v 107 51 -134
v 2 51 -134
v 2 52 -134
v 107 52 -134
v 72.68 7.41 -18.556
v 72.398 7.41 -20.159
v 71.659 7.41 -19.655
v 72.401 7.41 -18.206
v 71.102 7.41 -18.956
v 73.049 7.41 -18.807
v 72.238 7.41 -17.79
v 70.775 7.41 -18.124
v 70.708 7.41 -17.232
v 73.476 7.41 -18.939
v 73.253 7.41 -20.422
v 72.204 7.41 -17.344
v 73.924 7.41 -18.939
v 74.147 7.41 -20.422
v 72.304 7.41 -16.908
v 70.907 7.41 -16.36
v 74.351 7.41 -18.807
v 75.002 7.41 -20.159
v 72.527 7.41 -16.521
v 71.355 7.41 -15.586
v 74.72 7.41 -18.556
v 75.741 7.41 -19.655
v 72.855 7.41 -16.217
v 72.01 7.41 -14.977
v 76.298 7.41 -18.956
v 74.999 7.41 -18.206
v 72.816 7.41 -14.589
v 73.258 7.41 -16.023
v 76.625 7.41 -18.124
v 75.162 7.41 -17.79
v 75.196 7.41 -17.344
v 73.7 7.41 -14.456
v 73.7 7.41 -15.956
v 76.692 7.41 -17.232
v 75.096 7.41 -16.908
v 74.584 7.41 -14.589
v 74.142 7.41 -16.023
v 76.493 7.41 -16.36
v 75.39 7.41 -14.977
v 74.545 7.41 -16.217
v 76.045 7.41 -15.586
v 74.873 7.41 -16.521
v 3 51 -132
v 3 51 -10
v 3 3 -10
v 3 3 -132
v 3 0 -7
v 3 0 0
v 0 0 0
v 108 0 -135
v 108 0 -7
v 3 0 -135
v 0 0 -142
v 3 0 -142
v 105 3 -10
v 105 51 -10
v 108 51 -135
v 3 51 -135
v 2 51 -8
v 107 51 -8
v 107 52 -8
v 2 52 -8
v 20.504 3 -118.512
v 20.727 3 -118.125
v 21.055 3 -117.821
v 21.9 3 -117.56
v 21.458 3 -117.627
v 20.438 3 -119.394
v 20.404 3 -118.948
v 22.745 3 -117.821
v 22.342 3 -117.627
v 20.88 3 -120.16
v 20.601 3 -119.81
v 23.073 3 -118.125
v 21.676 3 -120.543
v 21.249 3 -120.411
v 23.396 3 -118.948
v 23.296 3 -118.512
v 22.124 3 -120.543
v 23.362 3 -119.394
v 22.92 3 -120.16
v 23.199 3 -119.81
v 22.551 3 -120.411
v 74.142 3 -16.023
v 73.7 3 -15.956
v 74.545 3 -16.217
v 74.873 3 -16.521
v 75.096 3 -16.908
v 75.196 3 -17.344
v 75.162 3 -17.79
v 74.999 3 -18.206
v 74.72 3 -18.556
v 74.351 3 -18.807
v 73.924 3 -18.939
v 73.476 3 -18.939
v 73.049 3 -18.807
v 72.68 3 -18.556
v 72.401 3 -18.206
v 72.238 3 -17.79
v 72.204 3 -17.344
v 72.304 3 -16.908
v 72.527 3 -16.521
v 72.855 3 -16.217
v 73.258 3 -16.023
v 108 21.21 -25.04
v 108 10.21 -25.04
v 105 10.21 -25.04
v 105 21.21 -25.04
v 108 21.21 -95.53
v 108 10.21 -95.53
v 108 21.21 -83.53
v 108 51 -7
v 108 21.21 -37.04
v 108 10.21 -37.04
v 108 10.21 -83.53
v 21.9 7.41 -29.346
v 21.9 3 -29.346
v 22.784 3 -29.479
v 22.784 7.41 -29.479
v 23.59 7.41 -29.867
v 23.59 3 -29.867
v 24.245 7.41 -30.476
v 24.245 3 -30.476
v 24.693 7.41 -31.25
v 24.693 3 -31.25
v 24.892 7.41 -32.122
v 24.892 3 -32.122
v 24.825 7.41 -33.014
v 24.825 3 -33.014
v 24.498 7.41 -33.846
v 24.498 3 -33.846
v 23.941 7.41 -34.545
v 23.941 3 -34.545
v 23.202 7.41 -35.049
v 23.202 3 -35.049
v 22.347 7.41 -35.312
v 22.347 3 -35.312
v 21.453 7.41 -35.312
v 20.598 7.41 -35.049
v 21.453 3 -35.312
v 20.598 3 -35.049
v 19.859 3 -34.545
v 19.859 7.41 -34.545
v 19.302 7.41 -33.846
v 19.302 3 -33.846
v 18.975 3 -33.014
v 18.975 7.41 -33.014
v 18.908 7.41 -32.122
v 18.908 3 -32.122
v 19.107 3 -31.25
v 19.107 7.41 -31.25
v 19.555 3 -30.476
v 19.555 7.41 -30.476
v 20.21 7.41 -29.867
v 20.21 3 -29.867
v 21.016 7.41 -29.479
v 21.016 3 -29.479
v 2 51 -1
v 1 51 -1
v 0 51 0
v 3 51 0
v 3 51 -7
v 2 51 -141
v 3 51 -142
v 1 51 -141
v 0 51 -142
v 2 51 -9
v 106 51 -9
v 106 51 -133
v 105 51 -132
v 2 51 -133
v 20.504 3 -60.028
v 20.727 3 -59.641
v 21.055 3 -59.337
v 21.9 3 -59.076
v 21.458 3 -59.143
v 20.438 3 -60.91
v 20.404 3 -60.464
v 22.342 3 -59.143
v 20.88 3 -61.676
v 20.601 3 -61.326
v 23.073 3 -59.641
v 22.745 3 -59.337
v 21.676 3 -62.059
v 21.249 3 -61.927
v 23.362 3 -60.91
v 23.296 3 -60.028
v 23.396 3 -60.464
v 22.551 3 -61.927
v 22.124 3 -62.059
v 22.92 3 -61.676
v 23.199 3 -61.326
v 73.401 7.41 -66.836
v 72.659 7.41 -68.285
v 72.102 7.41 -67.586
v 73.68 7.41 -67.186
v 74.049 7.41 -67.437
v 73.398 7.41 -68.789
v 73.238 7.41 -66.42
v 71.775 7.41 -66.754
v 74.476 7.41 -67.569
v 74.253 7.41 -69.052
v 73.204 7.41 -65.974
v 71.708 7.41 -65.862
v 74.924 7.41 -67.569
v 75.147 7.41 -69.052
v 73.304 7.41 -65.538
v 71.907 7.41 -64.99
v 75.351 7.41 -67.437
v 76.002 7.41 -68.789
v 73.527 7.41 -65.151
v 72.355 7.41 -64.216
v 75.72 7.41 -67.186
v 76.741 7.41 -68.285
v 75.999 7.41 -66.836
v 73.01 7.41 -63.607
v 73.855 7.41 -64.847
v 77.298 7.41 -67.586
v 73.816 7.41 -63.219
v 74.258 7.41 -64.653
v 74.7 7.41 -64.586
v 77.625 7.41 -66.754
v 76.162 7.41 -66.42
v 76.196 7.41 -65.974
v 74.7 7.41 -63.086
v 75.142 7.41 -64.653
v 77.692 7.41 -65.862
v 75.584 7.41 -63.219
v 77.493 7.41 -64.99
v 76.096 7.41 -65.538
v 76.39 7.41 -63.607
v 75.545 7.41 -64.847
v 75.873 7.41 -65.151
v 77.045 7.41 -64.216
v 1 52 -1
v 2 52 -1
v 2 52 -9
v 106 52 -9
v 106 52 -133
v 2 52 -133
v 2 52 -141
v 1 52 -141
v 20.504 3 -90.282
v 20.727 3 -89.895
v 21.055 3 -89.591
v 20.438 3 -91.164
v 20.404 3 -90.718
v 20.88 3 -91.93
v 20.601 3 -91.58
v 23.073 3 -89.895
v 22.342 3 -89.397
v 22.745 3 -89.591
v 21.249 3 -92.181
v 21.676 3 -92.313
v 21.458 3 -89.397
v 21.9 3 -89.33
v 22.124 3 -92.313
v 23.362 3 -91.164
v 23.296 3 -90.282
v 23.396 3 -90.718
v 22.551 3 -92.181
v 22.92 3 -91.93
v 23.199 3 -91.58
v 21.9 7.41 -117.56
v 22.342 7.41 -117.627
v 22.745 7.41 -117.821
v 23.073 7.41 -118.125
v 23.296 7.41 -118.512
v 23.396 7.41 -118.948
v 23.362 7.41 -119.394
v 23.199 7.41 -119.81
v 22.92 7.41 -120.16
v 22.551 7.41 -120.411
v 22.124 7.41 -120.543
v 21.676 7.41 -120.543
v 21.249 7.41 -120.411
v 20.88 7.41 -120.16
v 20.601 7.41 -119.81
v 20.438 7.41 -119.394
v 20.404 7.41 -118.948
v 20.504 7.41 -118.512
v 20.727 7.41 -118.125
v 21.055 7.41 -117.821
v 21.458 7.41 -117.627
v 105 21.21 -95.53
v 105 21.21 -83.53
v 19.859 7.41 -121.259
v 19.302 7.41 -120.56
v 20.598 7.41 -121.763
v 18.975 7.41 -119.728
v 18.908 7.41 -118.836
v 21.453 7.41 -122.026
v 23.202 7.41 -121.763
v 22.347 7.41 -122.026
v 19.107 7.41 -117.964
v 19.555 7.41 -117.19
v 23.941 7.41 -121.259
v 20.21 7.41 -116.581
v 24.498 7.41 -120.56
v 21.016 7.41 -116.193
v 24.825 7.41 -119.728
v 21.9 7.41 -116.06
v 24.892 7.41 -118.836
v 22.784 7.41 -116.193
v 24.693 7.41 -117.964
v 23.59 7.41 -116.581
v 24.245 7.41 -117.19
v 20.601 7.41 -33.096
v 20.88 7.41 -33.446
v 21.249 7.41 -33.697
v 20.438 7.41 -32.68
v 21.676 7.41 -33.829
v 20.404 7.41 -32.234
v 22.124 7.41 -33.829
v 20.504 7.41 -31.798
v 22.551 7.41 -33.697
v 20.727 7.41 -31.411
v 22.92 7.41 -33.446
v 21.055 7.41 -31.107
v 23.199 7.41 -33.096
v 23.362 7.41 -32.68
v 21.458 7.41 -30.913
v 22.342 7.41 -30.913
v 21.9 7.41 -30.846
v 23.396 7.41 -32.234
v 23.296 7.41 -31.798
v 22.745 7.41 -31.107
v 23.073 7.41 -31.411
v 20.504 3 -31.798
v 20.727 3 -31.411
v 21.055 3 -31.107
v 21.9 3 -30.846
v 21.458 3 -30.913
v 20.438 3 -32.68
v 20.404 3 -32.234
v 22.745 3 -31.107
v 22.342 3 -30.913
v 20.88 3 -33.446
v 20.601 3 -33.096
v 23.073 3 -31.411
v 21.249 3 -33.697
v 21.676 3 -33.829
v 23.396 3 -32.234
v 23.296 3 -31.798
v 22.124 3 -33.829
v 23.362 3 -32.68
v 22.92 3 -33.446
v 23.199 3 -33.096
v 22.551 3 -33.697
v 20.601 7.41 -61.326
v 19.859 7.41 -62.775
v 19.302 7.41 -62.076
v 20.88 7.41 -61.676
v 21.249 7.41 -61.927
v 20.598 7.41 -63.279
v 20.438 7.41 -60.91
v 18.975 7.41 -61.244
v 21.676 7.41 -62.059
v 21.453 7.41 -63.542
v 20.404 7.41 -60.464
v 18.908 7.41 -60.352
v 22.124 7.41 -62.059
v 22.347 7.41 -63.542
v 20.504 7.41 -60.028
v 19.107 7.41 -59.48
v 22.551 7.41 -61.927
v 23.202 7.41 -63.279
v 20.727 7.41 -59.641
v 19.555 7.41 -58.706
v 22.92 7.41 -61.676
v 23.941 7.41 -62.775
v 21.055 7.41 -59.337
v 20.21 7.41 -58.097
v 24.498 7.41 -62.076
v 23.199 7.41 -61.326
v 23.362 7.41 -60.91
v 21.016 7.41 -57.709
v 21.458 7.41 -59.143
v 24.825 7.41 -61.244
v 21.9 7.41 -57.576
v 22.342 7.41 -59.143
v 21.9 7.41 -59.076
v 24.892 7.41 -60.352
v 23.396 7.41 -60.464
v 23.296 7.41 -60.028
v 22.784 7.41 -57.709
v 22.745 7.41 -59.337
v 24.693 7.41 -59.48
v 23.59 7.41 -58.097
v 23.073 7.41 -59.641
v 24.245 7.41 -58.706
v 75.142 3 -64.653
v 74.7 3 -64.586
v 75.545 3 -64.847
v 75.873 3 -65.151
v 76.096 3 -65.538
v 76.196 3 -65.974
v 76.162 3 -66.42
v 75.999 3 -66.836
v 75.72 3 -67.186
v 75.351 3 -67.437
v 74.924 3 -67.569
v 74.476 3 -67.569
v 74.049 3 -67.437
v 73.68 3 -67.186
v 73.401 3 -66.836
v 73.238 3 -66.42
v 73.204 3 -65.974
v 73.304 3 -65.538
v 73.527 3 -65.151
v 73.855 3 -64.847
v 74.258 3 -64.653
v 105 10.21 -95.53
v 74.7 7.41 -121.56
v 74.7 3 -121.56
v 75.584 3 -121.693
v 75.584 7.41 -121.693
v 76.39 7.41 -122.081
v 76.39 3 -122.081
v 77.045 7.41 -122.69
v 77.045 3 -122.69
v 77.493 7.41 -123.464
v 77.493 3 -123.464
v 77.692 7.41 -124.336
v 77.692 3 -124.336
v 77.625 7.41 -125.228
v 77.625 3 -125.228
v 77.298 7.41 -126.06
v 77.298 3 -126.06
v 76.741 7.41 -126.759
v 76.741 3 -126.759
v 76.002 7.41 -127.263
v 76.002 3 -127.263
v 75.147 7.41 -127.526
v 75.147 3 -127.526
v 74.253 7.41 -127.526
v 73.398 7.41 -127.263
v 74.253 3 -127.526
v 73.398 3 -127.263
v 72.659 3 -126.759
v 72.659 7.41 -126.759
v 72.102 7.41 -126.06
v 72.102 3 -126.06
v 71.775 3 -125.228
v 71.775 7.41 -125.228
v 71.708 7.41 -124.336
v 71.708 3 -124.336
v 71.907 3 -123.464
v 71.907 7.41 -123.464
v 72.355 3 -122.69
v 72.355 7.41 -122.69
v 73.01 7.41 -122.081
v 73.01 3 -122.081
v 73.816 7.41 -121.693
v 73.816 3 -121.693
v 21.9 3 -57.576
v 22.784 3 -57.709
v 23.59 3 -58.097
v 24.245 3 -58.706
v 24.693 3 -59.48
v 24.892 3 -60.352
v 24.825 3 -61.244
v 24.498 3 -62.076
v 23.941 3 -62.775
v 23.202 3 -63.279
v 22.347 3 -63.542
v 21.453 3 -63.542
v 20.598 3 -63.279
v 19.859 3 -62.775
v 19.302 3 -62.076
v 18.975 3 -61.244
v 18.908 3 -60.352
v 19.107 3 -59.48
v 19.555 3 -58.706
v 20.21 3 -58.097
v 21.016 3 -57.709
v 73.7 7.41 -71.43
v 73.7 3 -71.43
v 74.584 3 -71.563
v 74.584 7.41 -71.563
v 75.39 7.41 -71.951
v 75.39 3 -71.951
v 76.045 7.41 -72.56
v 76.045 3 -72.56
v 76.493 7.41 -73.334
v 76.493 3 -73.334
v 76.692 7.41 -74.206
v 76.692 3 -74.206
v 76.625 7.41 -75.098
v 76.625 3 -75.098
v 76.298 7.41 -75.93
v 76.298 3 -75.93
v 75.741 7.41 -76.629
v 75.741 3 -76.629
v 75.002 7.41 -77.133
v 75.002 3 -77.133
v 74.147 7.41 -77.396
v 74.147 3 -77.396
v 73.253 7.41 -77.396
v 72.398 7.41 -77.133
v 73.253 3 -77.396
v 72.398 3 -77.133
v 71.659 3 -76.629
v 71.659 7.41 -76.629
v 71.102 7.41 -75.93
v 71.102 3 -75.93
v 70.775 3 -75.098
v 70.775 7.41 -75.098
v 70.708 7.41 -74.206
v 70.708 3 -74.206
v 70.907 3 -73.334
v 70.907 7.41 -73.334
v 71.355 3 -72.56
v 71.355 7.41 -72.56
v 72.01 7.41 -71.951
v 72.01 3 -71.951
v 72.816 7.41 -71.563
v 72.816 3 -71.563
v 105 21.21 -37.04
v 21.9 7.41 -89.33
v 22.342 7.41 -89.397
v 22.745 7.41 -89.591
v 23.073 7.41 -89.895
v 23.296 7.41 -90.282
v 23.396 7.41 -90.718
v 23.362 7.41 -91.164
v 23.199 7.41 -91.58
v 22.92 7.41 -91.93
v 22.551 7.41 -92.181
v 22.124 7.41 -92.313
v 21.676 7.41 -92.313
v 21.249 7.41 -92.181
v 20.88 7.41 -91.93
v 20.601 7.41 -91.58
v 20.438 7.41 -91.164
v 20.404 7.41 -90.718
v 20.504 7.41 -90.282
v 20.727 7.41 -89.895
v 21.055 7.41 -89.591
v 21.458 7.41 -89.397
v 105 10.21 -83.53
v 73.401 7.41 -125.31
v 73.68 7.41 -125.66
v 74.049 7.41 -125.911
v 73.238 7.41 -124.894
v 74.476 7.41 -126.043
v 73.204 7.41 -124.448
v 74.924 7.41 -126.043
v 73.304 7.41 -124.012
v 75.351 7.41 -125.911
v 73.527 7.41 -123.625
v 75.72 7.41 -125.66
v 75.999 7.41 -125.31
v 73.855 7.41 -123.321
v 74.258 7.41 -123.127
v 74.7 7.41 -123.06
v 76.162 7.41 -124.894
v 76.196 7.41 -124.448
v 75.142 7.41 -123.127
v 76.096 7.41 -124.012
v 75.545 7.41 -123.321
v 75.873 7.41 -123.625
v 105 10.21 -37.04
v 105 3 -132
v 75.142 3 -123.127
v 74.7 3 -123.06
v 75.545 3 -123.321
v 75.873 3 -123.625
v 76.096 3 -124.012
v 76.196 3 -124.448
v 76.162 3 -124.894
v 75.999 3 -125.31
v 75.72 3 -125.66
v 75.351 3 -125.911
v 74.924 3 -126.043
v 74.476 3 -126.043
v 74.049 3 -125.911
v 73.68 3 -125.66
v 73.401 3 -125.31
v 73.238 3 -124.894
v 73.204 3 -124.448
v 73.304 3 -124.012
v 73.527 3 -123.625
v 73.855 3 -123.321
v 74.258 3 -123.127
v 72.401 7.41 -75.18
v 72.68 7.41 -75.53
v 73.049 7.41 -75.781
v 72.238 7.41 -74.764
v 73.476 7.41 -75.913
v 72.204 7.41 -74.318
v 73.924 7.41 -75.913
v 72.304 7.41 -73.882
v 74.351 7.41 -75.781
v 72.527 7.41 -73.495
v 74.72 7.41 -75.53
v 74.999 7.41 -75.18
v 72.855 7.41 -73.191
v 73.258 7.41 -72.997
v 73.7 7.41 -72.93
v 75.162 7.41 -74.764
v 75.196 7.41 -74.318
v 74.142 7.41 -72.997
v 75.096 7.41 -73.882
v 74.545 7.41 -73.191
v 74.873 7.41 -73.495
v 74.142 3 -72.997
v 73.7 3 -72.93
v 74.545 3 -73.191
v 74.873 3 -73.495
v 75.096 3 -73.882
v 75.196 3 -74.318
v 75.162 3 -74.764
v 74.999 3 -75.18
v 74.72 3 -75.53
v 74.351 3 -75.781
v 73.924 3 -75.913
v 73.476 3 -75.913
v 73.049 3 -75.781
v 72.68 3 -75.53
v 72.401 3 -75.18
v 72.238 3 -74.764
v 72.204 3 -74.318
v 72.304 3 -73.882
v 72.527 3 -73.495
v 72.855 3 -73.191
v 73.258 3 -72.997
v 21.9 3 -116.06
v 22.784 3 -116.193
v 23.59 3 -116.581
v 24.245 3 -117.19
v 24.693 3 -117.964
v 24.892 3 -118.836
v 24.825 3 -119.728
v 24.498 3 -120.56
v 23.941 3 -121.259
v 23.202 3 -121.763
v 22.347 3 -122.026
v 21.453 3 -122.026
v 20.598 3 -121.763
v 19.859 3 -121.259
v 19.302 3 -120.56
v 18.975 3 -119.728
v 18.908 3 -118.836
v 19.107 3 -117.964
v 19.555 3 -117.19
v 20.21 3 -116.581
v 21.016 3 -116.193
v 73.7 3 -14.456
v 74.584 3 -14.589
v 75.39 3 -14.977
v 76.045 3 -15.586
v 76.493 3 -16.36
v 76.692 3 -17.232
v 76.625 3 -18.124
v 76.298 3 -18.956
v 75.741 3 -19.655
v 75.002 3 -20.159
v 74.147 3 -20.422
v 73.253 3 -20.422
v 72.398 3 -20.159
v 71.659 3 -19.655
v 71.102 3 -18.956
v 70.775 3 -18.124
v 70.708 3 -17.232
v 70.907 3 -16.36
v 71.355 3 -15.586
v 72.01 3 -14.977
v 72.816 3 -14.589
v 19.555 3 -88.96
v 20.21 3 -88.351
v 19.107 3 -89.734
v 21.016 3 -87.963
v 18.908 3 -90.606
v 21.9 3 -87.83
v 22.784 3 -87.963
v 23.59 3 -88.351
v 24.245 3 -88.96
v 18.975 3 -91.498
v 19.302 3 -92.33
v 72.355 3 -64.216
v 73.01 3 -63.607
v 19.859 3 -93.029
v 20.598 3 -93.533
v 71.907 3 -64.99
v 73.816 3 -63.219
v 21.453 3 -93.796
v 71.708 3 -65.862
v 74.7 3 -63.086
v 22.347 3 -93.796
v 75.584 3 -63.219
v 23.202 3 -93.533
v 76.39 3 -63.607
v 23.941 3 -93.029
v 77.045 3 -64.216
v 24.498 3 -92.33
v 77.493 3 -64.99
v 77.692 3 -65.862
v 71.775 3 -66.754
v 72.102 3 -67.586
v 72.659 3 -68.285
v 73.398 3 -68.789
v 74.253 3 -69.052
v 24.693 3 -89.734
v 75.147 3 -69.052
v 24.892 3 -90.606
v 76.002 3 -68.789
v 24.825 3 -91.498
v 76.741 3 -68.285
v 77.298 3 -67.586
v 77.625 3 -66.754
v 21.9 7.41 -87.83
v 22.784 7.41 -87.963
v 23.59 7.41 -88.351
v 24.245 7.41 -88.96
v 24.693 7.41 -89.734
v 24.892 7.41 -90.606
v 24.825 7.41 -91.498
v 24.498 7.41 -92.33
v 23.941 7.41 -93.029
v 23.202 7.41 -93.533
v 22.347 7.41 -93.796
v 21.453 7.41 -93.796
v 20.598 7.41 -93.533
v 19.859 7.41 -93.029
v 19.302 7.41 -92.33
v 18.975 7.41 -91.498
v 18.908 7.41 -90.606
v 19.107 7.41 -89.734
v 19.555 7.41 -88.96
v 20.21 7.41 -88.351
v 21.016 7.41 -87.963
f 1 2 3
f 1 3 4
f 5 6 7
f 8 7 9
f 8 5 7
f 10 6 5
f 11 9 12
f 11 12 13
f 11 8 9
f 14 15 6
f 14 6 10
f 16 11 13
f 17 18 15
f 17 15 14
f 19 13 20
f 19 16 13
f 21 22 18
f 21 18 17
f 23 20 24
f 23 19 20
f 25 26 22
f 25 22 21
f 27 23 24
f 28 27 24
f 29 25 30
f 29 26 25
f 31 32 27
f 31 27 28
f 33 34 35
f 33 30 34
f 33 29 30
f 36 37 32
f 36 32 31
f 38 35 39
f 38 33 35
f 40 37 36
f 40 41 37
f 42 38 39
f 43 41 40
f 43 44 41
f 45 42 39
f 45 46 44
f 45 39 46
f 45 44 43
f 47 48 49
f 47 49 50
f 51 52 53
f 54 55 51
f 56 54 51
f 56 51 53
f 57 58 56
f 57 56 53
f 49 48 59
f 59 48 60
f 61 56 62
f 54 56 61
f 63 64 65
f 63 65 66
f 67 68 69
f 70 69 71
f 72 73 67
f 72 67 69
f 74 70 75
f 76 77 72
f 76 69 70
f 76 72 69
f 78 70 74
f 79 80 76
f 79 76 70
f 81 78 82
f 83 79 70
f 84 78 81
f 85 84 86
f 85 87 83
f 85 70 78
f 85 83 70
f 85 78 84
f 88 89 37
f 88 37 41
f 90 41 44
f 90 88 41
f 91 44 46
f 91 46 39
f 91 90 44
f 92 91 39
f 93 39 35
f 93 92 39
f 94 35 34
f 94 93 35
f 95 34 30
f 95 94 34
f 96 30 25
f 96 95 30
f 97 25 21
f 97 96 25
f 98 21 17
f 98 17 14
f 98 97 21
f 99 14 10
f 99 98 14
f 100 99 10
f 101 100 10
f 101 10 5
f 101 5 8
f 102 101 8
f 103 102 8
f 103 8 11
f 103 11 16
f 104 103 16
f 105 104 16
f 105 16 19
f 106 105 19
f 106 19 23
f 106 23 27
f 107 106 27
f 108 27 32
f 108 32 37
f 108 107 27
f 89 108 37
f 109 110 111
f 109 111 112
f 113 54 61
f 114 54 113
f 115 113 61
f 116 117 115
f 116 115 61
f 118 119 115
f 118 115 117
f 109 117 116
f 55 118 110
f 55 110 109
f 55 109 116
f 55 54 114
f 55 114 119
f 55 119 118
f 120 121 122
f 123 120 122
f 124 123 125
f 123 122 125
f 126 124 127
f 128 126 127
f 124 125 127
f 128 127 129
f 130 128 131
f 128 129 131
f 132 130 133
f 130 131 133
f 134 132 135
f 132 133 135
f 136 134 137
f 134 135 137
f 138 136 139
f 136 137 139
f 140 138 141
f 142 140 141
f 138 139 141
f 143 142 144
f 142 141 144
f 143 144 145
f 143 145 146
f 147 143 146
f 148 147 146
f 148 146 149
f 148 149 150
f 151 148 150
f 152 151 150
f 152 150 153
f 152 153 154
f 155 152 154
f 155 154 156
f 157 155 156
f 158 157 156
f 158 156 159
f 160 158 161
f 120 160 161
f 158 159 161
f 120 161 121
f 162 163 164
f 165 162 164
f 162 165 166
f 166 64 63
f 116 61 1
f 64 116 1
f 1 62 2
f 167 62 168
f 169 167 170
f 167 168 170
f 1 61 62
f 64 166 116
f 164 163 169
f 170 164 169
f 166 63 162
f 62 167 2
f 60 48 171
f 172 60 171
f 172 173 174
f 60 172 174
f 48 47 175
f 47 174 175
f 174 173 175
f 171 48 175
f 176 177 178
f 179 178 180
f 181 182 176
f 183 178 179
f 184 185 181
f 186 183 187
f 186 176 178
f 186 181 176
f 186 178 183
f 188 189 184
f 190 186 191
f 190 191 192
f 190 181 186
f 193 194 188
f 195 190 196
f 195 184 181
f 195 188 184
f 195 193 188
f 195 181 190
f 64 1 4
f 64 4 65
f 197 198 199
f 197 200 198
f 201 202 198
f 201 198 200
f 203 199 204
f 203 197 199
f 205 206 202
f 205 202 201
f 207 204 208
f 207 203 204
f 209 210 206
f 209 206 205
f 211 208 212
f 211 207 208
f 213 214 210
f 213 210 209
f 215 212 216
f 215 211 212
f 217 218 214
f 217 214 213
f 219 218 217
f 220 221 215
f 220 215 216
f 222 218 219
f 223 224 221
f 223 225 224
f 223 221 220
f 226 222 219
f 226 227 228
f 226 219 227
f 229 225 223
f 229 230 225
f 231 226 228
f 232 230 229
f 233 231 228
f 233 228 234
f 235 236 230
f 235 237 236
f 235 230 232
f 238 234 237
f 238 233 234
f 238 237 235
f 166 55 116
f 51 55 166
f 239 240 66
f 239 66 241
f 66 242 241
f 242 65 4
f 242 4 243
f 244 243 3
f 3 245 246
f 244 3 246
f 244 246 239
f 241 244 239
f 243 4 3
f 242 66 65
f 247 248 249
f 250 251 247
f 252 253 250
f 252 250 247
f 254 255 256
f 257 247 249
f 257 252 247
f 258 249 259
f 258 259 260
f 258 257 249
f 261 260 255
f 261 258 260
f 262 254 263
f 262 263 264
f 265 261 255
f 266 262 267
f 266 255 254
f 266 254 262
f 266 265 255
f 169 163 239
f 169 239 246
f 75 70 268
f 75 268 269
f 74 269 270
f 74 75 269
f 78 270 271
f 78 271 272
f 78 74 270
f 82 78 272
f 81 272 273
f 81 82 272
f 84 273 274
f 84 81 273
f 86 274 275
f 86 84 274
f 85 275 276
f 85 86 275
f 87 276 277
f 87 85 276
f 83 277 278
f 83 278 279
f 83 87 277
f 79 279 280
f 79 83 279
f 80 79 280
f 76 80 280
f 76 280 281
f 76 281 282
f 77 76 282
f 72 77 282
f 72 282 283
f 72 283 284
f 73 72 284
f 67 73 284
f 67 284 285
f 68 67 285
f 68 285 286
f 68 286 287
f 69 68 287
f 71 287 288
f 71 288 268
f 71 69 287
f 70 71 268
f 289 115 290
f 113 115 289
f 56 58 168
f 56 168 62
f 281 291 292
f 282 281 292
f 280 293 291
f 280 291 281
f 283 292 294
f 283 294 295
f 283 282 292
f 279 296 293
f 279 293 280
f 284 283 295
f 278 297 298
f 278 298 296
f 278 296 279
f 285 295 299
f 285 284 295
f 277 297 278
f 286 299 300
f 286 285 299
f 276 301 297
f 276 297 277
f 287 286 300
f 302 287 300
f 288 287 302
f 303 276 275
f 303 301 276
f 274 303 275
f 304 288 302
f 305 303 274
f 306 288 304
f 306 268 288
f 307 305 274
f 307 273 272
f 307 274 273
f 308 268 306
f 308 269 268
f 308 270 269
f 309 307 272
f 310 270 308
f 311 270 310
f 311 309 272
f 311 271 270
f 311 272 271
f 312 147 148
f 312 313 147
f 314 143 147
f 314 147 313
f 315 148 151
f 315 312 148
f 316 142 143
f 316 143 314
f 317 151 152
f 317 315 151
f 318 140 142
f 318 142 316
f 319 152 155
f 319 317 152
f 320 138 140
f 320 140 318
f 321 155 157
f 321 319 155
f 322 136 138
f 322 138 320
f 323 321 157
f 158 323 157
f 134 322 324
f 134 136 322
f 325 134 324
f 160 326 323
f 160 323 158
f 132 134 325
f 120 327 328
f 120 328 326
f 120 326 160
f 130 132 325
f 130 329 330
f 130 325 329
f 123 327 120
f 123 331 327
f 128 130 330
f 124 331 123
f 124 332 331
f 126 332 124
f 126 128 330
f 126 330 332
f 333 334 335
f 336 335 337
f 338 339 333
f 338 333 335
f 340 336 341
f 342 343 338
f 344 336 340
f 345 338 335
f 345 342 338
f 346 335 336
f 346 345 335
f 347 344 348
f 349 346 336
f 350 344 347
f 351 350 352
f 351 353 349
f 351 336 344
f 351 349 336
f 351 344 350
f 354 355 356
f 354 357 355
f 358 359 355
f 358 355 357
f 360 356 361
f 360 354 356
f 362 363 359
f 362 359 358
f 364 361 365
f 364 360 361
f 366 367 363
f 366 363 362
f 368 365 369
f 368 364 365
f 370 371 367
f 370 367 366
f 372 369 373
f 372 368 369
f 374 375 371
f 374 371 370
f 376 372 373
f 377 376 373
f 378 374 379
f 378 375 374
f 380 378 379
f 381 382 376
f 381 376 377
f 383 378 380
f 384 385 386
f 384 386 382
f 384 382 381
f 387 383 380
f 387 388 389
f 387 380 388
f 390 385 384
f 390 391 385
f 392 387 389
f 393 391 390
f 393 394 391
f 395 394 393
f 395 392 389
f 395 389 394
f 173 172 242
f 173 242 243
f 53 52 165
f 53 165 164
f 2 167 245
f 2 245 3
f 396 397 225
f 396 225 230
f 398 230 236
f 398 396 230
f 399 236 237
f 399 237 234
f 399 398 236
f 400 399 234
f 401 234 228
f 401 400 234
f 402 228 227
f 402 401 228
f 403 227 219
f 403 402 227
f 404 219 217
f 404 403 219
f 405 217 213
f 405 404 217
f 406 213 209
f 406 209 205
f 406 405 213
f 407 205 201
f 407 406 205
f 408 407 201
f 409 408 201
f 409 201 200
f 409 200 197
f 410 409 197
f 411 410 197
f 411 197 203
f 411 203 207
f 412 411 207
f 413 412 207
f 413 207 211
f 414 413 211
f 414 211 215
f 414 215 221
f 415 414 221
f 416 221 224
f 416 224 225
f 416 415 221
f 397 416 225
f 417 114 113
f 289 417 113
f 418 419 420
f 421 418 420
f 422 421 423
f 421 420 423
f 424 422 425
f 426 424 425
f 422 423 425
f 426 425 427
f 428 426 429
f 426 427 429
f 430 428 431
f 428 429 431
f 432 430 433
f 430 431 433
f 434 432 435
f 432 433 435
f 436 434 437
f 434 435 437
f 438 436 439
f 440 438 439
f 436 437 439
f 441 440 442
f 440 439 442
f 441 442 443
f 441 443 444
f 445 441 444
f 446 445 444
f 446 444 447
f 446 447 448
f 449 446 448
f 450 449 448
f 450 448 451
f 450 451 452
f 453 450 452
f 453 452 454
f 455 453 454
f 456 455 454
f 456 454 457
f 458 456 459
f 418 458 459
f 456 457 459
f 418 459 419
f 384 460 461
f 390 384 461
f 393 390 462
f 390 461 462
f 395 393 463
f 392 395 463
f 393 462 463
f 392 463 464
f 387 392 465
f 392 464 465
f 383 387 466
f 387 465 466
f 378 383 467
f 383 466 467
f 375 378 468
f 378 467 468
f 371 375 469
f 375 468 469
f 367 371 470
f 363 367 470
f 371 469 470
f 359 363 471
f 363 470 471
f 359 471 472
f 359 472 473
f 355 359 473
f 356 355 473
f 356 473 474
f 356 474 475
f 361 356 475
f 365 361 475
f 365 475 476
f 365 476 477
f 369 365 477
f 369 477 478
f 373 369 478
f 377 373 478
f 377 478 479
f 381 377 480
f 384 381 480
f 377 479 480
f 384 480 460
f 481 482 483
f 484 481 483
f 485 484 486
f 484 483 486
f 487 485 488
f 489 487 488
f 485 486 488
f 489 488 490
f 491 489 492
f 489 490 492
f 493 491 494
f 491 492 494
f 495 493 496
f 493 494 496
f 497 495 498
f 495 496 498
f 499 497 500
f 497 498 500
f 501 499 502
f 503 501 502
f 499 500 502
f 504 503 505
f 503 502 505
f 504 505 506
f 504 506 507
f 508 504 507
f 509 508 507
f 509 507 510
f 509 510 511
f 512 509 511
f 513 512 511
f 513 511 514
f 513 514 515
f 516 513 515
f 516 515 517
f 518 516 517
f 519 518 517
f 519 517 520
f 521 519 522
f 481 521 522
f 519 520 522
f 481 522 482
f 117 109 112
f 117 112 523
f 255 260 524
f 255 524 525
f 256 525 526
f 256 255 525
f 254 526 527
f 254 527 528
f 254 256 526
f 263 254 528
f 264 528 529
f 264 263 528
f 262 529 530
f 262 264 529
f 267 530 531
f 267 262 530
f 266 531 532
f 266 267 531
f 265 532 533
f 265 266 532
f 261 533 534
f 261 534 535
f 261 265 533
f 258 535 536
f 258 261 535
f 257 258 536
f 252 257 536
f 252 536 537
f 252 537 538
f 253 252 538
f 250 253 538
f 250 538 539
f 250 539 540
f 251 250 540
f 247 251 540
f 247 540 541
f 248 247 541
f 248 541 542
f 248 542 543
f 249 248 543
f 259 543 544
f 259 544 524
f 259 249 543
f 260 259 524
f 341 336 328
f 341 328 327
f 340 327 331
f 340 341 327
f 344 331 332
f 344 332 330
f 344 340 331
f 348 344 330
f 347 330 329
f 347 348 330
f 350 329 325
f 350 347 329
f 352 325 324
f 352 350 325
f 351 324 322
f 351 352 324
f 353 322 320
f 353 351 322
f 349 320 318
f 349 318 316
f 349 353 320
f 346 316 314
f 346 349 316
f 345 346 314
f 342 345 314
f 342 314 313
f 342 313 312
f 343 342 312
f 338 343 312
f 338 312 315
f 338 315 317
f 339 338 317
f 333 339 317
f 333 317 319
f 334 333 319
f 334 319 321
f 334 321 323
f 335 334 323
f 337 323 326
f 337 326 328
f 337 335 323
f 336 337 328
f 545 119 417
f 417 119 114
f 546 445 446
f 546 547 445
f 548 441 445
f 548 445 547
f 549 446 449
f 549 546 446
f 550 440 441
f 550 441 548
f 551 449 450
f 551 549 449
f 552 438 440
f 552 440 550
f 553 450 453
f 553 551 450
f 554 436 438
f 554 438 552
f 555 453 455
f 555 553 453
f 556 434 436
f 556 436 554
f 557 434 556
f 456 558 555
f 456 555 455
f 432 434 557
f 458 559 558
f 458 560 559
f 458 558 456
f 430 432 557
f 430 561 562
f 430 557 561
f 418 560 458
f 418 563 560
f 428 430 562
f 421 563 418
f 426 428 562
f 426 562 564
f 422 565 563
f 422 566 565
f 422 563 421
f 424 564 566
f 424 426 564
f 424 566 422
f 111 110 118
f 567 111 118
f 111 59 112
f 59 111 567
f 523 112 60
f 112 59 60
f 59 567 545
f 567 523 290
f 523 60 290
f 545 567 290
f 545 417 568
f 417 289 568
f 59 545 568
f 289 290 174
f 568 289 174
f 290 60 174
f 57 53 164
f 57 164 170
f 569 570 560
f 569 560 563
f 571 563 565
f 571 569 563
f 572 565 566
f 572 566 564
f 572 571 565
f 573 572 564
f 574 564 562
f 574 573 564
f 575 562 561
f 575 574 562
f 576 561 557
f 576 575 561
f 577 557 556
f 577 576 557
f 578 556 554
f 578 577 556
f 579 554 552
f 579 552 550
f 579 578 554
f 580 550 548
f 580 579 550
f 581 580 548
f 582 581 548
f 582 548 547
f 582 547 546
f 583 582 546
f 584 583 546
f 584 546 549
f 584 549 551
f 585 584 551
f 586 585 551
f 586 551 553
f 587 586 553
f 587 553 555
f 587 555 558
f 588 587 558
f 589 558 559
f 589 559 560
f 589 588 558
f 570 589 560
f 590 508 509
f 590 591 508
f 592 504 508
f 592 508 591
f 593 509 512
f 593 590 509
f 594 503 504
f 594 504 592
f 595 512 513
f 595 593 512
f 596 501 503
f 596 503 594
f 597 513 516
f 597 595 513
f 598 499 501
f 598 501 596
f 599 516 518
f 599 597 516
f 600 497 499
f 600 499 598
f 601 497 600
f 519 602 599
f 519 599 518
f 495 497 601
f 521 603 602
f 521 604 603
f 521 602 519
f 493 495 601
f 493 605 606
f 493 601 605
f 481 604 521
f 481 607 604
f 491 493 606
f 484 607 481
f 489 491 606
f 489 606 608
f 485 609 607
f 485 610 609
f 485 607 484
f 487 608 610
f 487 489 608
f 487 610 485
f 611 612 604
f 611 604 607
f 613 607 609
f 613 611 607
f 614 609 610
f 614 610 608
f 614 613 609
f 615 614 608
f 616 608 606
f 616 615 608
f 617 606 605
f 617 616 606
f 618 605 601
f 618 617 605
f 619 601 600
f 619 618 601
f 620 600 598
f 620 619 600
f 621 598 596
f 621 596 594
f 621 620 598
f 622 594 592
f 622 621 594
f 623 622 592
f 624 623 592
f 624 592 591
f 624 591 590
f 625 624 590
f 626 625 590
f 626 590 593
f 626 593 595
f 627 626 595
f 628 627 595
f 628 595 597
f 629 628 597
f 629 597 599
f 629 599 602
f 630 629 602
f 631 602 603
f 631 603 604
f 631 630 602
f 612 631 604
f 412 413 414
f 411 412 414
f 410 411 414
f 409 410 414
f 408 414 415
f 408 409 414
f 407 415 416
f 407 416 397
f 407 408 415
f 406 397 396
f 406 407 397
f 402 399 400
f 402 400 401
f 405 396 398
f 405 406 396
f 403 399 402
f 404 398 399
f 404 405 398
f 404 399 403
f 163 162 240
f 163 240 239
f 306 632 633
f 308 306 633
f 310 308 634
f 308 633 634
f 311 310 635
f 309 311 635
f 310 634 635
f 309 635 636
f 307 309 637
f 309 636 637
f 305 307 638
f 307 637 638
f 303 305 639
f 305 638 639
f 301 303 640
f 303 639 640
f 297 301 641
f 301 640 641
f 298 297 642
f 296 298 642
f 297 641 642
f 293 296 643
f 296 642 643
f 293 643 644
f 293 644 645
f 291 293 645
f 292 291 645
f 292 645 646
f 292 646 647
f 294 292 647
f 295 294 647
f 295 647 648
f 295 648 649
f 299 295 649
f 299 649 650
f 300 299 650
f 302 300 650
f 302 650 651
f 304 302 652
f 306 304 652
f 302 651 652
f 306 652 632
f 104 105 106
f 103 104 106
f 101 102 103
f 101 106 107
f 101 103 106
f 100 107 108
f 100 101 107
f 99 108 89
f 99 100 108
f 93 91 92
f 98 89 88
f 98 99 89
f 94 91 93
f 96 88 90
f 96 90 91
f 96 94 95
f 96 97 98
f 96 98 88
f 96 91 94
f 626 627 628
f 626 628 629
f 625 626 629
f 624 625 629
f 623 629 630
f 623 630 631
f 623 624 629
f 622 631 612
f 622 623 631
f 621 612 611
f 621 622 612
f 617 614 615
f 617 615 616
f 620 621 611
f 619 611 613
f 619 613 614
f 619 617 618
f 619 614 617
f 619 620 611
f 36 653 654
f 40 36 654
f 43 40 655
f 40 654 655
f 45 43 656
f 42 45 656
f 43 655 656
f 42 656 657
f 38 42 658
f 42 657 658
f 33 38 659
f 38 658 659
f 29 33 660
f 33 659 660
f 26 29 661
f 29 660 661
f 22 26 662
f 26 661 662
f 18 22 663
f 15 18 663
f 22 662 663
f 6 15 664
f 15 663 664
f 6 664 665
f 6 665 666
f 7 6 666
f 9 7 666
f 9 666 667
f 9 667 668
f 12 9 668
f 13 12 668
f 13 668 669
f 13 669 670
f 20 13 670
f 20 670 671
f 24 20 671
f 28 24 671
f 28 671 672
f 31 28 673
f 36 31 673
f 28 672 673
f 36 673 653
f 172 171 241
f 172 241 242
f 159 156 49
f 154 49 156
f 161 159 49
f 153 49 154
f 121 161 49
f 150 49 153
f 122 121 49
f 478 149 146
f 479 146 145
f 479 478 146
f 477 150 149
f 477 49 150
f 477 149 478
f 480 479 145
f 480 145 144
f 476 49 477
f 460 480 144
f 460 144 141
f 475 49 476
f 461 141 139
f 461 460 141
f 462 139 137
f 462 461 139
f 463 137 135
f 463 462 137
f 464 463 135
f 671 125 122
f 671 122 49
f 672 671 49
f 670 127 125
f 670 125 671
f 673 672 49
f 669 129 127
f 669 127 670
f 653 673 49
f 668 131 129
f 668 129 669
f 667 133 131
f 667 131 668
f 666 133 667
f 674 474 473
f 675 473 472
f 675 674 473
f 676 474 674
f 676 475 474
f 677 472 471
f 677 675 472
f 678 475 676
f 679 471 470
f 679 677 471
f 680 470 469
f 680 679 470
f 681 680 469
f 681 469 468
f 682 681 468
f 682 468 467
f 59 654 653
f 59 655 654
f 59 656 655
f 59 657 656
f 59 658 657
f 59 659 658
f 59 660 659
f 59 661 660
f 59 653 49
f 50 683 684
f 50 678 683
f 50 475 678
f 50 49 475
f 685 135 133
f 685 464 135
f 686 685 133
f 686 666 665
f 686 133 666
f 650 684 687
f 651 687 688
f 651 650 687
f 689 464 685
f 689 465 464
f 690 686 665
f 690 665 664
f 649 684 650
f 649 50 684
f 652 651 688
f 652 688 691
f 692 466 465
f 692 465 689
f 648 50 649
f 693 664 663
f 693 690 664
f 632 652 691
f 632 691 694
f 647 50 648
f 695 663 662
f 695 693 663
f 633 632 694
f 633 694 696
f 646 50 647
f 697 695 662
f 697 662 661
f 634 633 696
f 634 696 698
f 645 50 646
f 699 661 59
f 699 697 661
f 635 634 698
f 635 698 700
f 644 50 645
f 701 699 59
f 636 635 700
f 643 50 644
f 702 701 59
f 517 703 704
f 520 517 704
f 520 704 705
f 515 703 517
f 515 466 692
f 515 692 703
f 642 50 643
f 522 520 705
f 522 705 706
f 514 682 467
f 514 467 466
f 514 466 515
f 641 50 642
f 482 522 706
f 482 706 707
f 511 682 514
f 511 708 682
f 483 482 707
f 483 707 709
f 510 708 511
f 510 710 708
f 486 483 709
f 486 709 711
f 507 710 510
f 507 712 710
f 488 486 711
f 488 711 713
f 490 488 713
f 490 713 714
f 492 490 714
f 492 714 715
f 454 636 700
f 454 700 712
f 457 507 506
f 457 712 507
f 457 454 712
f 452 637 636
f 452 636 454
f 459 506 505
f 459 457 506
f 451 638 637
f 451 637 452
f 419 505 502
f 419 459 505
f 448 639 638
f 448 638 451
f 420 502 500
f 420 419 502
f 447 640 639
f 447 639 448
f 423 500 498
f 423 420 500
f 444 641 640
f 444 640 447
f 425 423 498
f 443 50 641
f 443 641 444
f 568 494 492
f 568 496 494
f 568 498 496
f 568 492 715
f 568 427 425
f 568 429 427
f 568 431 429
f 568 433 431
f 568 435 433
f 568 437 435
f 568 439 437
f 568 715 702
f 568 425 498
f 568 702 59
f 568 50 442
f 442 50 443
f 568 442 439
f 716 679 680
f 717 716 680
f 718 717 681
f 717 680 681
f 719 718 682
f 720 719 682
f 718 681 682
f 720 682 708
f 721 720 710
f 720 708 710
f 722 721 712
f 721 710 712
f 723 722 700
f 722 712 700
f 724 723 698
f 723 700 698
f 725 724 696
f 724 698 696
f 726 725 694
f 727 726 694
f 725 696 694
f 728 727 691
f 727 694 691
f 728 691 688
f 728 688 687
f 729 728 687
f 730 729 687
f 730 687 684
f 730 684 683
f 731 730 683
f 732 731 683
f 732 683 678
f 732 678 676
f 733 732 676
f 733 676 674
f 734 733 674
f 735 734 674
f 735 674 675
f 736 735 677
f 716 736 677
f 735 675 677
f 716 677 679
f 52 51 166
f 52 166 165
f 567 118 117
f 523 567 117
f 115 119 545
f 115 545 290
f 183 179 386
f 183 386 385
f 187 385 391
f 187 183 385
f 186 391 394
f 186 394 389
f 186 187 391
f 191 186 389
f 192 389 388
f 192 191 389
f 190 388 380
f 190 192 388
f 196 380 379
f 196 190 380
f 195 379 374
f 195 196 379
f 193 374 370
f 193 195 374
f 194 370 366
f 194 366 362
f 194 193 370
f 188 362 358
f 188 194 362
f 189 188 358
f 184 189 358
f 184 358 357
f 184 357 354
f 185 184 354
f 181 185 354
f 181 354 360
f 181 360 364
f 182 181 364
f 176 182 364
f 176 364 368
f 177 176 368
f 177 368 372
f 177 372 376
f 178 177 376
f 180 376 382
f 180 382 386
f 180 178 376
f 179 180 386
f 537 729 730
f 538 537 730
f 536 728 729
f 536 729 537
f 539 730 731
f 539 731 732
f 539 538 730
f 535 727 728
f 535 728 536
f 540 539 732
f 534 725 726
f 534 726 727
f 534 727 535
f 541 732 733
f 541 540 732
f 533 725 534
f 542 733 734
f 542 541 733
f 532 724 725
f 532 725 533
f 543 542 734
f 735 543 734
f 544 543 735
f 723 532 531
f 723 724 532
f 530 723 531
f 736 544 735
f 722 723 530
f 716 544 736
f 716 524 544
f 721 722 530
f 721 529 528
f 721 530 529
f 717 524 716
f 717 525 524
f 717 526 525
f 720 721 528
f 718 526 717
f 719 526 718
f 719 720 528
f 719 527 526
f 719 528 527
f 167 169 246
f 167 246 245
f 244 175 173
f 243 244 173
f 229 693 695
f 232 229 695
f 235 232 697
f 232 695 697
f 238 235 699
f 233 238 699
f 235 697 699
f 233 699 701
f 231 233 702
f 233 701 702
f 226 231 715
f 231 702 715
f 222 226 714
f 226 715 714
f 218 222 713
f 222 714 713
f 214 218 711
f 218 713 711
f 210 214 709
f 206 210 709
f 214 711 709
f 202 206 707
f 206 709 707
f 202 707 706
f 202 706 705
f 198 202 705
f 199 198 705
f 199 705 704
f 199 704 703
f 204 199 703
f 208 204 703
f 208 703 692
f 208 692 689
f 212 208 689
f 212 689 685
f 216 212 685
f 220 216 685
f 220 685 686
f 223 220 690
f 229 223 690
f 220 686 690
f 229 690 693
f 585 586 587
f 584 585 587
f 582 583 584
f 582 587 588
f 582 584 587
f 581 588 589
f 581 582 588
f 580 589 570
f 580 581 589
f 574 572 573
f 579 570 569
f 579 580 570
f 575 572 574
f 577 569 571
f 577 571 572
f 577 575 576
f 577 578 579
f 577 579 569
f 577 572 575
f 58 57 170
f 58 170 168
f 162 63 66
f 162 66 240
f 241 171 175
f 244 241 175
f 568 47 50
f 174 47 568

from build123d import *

# Parameters (mm, degrees)
BOSS_EXTRU_1_DEPTH      = 51
ESQUISSE2_W             = 102
ESQUISSE2_H             = 122
ENL_V_MAT_EXTRU_1_DEPTH = 48
ESQUISSE4_W             = 104
ESQUISSE4_H             = 124
BOSS_EXTRU_4_DEPTH      = 1
ESQUISSE5_R             = 3
ESQUISSE5_R_2           = 1.5
BOSS_EXTRU_5_DEPTH      = 4.41
ESQUISSE7_W             = 12
ESQUISSE7_H             = 11
ENL_V_MAT_EXTRU_2_DEPTH = 3


with BuildPart() as part:
    # Esquisse1 → Boss.-Extru.1 (new body)
    with BuildSketch(Plane(origin=(0, 0, 0), x_dir=(1, 0, 0), z_dir=(0, 1, 0))):
        Polygon((0, 0), (0, 142), (3, 142), (3, 135), (108, 135), (108, 7), (3, 7), (3, 0), align=None)
    extrude(amount=BOSS_EXTRU_1_DEPTH)

    # Esquisse2 → Enlèv. mat.-Extru.1 (cut)
    with BuildSketch(Plane(origin=(0, 51, 0), x_dir=(1, 0, 0), z_dir=(0, 1, 0))):
        with Locations((54, 71)):
            Rectangle(ESQUISSE2_W, ESQUISSE2_H)
    extrude(amount=-ENL_V_MAT_EXTRU_1_DEPTH, mode=Mode.SUBTRACT)

    # Esquisse4 → Boss.-Extru.4 (add)
    with BuildSketch(Plane(origin=(0, 51, 0), x_dir=(1, 0, 0), z_dir=(0, 1, 0))):
        Polygon((1, 1), (1, 141), (2, 141), (2, 134), (107, 134), (107, 8), (2, 8), (2, 1), align=None)
        with Locations((54, 71)):
            Rectangle(ESQUISSE4_W, ESQUISSE4_H, mode=Mode.SUBTRACT)
    extrude(amount=BOSS_EXTRU_4_DEPTH)

    # Esquisse5 → Boss.-Extru.5 (add)
    # profile 1 of 8: a face of its own
    with BuildSketch(Plane(origin=(0, 3, 0), x_dir=(1, 0, 0), z_dir=(0, 1, 0))):
        with Locations(Location((74.7, 124.56, 0), (0, 0, 270))):
            Circle(ESQUISSE5_R)
        with Locations(Location((74.7, 124.56, 0), (0, 0, 270))):
            Circle(ESQUISSE5_R_2, mode=Mode.SUBTRACT)
    # profile 2 of 8: a face of its own
    with BuildSketch(Plane(origin=(0, 3, 0), x_dir=(1, 0, 0), z_dir=(0, 1, 0))):
        with Locations(Location((73.7, 74.43, 0), (0, 0, 270))):
            Circle(ESQUISSE5_R)
        with Locations(Location((73.7, 74.43, 0), (0, 0, 270))):
            Circle(ESQUISSE5_R_2, mode=Mode.SUBTRACT)
    # profile 3 of 8: a face of its own
    with BuildSketch(Plane(origin=(0, 3, 0), x_dir=(1, 0, 0), z_dir=(0, 1, 0))):
        with Locations(Location((21.9, 32.346, 0), (0, 0, 270))):
            Circle(ESQUISSE5_R)
        with Locations(Location((21.9, 32.346, 0), (0, 0, 270))):
            Circle(ESQUISSE5_R_2, mode=Mode.SUBTRACT)
    # profile 4 of 8: a face of its own
    with BuildSketch(Plane(origin=(0, 3, 0), x_dir=(1, 0, 0), z_dir=(0, 1, 0))):
        with Locations(Location((73.7, 17.456, 0), (0, 0, 270))):
            Circle(ESQUISSE5_R)
        with Locations(Location((73.7, 17.456, 0), (0, 0, 270))):
            Circle(ESQUISSE5_R_2, mode=Mode.SUBTRACT)
    # profile 5 of 8: a face of its own
    with BuildSketch(Plane(origin=(0, 3, 0), x_dir=(1, 0, 0), z_dir=(0, 1, 0))):
        with Locations(Location((21.9, 60.576, 0), (0, 0, 270))):
            Circle(ESQUISSE5_R)
        with Locations(Location((21.9, 60.576, 0), (0, 0, 270))):
            Circle(ESQUISSE5_R_2, mode=Mode.SUBTRACT)
    # profile 6 of 8: a face of its own
    with BuildSketch(Plane(origin=(0, 3, 0), x_dir=(1, 0, 0), z_dir=(0, 1, 0))):
        with Locations(Location((21.9, 119.06, 0), (0, 0, 270))):
            Circle(ESQUISSE5_R)
        with Locations(Location((21.9, 119.06, 0), (0, 0, 270))):
            Circle(ESQUISSE5_R_2, mode=Mode.SUBTRACT)
    # profile 7 of 8: a face of its own
    with BuildSketch(Plane(origin=(0, 3, 0), x_dir=(1, 0, 0), z_dir=(0, 1, 0))):
        with Locations(Location((74.7, 66.086, 0), (0, 0, 270))):
            Circle(ESQUISSE5_R)
        with Locations(Location((74.7, 66.086, 0), (0, 0, 270))):
            Circle(ESQUISSE5_R_2, mode=Mode.SUBTRACT)
    # profile 8 of 8: a face of its own
    with BuildSketch(Plane(origin=(0, 3, 0), x_dir=(1, 0, 0), z_dir=(0, 1, 0))):
        with Locations(Location((21.9, 90.83, 0), (0, 0, 270))):
            Circle(ESQUISSE5_R)
        with Locations(Location((21.9, 90.83, 0), (0, 0, 270))):
            Circle(ESQUISSE5_R_2, mode=Mode.SUBTRACT)
    extrude(amount=BOSS_EXTRU_5_DEPTH)

    # Esquisse7 → Enlèv. mat.-Extru.2 (cut)
    with BuildSketch(Plane(origin=(108, 0, 0), x_dir=(0, 0, -1), z_dir=(1, 0, 0))):
        with Locations((31.04, 15.71)):
            Rectangle(ESQUISSE7_W, ESQUISSE7_H)
        with Locations((89.53, 15.71)):
            Rectangle(ESQUISSE7_W, ESQUISSE7_H)
    extrude(amount=-ENL_V_MAT_EXTRU_2_DEPTH, mode=Mode.SUBTRACT)


solid = part.part
